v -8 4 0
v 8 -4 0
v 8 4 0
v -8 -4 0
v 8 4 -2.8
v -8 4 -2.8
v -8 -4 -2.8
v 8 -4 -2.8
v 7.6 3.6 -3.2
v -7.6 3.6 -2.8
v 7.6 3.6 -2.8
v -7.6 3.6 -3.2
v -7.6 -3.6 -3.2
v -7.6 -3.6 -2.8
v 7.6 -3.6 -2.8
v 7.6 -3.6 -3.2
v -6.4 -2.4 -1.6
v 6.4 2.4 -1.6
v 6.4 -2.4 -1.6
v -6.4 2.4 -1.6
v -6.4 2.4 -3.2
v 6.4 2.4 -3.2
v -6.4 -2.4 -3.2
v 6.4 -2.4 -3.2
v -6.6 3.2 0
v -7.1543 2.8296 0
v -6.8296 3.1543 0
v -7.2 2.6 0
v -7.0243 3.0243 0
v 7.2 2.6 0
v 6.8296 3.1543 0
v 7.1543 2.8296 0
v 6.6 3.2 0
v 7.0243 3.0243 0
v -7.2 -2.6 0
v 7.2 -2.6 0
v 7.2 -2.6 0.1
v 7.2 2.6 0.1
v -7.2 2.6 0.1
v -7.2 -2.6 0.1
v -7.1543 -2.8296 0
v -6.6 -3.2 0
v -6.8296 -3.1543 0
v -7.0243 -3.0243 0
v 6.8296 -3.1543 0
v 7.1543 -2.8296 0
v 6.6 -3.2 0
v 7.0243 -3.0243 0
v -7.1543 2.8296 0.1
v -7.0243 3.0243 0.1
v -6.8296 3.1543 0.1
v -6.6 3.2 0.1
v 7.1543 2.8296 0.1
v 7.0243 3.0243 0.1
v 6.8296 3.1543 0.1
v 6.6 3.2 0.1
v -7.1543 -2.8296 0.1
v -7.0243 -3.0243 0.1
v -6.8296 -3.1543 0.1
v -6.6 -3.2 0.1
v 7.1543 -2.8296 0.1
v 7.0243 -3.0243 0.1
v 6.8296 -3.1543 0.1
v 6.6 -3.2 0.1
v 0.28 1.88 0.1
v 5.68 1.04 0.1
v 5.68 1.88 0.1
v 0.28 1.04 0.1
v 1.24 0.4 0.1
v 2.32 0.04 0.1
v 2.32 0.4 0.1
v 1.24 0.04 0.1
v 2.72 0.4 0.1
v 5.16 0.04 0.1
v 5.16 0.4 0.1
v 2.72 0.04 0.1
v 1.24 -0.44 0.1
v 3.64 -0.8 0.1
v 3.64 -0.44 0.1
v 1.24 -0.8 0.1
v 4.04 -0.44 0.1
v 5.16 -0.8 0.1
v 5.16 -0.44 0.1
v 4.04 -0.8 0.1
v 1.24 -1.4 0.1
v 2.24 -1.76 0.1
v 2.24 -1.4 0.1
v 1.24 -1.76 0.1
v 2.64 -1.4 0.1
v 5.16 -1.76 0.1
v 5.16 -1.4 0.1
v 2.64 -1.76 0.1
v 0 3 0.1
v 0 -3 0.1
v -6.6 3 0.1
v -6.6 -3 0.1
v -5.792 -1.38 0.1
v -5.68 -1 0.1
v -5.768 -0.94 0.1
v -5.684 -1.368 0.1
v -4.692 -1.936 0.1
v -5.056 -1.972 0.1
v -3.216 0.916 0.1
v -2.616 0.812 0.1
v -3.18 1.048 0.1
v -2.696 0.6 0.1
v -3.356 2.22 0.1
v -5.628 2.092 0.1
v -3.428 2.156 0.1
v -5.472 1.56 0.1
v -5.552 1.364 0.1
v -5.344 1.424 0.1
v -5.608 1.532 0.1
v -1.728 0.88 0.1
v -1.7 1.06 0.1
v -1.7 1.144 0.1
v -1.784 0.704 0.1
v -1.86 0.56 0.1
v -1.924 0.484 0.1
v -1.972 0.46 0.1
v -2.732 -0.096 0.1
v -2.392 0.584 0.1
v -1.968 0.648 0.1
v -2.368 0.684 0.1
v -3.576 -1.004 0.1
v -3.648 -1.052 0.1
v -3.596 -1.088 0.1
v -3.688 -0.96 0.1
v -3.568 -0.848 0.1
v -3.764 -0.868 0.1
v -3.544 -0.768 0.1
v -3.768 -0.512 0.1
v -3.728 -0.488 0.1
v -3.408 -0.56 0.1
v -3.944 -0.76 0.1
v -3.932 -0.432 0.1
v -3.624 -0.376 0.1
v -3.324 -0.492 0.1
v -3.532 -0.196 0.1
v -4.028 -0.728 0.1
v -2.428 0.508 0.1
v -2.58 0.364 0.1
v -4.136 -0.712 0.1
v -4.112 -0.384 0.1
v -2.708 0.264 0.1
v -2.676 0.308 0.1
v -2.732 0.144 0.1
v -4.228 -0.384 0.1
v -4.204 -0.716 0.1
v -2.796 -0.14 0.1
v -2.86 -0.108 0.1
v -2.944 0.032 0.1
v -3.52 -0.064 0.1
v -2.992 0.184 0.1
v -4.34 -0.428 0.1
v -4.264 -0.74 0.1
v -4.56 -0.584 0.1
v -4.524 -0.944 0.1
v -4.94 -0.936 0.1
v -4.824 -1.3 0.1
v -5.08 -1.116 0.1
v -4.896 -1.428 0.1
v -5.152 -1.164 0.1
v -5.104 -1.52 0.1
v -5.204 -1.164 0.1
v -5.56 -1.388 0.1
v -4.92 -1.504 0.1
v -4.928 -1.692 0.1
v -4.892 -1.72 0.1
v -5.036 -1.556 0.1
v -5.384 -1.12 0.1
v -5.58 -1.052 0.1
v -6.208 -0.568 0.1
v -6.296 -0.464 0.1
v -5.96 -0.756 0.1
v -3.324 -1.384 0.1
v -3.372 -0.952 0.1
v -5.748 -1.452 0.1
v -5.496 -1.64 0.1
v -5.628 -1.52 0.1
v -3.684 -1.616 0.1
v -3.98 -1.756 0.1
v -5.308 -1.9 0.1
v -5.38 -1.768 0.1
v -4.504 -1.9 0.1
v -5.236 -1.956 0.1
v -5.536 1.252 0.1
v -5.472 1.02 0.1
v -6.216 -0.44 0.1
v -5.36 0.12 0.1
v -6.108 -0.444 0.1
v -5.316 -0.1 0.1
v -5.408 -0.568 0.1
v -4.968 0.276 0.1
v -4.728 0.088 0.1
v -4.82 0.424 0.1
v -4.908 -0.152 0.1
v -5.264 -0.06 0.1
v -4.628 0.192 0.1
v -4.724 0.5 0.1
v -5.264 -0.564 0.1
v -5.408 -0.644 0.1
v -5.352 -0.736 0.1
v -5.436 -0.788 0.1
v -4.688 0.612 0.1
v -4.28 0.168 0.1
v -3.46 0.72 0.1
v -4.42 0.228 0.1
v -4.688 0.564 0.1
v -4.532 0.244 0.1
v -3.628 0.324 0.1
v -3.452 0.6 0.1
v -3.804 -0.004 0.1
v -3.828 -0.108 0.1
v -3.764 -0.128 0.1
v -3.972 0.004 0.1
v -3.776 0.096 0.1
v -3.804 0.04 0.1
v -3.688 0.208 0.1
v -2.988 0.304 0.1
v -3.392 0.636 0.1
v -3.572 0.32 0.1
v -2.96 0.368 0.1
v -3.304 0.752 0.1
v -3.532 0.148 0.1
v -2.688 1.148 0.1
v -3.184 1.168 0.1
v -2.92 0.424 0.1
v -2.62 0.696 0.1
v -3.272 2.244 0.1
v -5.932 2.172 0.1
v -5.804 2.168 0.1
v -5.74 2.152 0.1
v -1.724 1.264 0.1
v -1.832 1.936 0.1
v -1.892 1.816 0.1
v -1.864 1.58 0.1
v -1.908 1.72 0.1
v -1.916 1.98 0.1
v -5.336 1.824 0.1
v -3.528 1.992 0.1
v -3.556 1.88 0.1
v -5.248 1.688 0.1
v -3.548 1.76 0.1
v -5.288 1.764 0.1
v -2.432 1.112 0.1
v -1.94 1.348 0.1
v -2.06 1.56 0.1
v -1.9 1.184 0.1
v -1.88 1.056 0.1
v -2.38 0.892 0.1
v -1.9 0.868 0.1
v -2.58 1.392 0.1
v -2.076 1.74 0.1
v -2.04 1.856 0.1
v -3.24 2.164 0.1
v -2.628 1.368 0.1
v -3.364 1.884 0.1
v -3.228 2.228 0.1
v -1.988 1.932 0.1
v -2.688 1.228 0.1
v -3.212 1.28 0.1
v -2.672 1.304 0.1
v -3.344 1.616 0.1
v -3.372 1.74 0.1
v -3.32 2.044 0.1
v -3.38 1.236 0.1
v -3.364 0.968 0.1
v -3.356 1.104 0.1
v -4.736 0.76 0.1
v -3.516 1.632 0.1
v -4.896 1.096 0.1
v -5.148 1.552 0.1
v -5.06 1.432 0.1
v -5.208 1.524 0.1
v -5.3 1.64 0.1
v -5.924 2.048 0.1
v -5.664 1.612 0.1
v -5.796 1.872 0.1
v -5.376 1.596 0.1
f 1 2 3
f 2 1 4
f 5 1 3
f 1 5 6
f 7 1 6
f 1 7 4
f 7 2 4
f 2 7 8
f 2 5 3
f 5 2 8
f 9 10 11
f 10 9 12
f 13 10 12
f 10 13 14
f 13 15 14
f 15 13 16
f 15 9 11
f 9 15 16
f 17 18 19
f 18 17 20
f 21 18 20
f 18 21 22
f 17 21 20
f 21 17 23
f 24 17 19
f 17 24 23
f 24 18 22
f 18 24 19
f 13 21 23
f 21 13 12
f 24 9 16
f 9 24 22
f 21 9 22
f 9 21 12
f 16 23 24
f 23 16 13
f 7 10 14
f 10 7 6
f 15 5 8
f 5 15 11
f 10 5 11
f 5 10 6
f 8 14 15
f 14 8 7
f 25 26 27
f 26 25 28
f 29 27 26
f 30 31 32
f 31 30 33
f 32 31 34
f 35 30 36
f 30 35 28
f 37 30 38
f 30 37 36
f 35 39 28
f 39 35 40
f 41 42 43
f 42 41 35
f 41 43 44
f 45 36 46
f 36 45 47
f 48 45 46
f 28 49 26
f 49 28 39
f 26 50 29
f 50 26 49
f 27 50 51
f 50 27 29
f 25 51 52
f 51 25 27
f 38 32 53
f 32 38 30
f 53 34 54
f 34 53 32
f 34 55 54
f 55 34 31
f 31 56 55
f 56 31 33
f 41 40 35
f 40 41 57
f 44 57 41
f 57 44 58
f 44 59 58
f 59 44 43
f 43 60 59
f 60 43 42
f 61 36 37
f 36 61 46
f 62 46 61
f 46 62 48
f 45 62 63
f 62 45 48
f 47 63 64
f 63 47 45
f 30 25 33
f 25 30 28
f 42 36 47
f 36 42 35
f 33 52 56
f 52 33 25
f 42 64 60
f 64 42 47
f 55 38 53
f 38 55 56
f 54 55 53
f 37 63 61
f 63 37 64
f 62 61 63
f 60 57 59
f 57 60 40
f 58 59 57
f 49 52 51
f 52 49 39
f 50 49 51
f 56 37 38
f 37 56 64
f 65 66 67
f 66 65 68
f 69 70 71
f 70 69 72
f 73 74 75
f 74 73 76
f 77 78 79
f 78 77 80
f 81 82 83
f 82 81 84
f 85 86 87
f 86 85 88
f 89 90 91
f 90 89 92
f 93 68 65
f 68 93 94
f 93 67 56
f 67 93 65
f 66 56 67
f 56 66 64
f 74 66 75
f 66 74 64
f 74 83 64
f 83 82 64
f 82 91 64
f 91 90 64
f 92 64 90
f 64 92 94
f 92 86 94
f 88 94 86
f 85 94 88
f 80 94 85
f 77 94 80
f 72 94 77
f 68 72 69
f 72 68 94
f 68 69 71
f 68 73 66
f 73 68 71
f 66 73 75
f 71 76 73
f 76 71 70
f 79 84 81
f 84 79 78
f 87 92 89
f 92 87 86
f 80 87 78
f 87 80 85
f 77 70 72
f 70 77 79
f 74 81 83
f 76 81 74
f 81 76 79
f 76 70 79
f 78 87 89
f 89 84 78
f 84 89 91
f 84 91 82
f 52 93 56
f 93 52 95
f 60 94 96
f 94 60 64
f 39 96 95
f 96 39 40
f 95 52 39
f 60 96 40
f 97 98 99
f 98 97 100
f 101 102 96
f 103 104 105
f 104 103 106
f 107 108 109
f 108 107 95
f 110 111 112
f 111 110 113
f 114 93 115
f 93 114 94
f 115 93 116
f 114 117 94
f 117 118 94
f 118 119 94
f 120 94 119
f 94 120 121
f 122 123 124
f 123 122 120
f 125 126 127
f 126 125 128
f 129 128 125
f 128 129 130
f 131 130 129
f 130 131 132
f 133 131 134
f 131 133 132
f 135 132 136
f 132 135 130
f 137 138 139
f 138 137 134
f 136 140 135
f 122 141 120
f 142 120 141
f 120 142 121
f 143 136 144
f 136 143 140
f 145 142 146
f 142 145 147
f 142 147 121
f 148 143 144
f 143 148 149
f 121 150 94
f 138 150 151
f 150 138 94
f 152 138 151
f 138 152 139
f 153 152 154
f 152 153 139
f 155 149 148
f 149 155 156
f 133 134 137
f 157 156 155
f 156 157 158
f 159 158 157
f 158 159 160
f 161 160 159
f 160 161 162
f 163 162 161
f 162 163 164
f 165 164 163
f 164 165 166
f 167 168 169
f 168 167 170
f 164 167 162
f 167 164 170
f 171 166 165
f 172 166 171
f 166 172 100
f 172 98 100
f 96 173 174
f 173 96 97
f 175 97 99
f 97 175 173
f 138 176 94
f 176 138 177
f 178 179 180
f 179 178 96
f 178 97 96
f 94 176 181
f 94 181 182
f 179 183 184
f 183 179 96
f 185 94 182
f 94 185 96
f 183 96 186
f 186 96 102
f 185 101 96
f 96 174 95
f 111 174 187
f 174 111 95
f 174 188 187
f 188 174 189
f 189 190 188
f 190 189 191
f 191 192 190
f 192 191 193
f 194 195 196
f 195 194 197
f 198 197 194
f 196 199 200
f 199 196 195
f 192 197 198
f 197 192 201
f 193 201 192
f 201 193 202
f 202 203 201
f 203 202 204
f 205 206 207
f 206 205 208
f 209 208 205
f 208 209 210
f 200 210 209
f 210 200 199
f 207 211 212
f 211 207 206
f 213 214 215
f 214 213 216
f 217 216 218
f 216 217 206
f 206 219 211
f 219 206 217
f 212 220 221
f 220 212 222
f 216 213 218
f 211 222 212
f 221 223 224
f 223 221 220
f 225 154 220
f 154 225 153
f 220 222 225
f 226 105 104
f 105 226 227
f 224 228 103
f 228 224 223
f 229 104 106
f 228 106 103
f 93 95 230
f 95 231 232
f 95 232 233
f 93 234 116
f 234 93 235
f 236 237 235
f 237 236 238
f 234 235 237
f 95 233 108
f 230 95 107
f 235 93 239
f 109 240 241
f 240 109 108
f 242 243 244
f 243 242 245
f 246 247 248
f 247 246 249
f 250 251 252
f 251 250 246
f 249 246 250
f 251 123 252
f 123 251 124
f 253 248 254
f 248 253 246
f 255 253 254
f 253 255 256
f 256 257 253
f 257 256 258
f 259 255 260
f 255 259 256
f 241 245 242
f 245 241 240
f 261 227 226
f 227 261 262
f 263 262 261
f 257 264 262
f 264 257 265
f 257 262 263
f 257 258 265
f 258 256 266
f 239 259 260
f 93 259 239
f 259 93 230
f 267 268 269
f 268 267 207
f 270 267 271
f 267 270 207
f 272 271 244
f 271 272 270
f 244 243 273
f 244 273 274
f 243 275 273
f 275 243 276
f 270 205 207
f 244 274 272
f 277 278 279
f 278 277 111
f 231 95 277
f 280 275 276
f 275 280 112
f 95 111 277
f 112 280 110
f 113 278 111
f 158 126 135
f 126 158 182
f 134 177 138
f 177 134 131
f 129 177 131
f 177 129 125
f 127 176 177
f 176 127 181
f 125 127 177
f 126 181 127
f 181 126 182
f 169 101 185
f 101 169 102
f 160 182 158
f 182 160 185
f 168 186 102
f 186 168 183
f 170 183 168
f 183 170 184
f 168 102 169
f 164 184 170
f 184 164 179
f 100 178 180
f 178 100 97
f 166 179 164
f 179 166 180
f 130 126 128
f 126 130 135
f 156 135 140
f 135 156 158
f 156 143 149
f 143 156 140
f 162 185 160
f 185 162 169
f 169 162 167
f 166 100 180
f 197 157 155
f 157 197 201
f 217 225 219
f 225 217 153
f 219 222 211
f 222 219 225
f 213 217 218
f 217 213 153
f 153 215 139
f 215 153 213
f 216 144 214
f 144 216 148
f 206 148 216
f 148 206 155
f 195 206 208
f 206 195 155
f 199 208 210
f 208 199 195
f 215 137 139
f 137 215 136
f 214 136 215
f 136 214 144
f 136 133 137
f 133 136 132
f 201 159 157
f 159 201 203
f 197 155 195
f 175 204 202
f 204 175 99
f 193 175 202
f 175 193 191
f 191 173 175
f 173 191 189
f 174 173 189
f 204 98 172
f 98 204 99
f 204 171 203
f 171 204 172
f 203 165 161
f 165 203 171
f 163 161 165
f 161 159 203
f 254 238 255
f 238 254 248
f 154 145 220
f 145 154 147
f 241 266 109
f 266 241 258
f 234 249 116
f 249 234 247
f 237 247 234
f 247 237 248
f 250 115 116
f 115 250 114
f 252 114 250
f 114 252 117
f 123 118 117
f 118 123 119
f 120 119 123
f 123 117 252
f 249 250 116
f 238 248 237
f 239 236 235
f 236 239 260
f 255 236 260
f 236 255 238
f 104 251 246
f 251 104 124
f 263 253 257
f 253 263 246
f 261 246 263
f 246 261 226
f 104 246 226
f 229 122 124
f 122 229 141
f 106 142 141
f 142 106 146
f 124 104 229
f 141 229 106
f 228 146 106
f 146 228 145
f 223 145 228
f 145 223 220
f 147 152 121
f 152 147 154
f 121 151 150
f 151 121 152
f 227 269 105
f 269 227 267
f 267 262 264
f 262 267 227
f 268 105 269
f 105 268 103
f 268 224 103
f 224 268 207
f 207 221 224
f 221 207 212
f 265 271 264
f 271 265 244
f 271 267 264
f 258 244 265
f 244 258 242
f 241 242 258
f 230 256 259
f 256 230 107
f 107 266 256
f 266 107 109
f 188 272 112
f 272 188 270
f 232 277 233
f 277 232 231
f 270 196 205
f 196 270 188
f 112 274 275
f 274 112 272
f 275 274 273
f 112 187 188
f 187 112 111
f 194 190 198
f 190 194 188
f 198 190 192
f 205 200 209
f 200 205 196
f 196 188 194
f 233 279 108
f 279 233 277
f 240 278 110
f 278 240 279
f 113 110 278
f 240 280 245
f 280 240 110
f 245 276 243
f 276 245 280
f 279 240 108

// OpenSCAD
use <../lib.scad>
use <3069b.scad>
use <6435269b.scad>
function ldraw_lib__3069bd19() = [
// 0 Tile  1 x  2 with Amorphophallus Titanium Sign Sticker
// 0 Name: 3069bd19.dat
// 0 Author: Philippe Hurbain [Philo]
// 0 !LDRAW_ORG Shortcut UPDATE 2025-08
// 0 !LICENSE Licensed under CC BY 4.0 : see CAreadme.txt
// 
// 0 BFC CERTIFY CCW
  [0,"BFC","CERTIFY"],
  [0,"BFC","CCW"],
// 
// 0 !CATEGORY Sticker Shortcut
// 0 !KEYWORDS Bricklink 41757stk01, Rebrickable 10109627, Set 41757
// 
// 0 !HISTORY 2025-08-31 [OrionP] Official Update 2025-08
// 
// 1 16 0 0 0 1 0 0 0 1 0 0 0 1 3069b.dat
  [1,16,0,0,0,1,0,0,0,1,0,0,0,1, ldraw_lib__3069b()],
// 1 16 0 0 0 1 0 0 0 1 0 0 0 1 6435269b.dat
  [1,16,0,0,0,1,0,0,0,1,0,0,0,1, ldraw_lib__6435269b()],
];
module ldraw_lib__3069bd19(step=0, col=false, unit=2/5, alt=false, line=0.2, solid=!$preview)
    makepoly(ldraw_lib__3069bd19(), step=step, col=col, unit=unit, alt=alt, line=line, solid=solid);
ldraw_lib__3069bd19(line=0.2);
